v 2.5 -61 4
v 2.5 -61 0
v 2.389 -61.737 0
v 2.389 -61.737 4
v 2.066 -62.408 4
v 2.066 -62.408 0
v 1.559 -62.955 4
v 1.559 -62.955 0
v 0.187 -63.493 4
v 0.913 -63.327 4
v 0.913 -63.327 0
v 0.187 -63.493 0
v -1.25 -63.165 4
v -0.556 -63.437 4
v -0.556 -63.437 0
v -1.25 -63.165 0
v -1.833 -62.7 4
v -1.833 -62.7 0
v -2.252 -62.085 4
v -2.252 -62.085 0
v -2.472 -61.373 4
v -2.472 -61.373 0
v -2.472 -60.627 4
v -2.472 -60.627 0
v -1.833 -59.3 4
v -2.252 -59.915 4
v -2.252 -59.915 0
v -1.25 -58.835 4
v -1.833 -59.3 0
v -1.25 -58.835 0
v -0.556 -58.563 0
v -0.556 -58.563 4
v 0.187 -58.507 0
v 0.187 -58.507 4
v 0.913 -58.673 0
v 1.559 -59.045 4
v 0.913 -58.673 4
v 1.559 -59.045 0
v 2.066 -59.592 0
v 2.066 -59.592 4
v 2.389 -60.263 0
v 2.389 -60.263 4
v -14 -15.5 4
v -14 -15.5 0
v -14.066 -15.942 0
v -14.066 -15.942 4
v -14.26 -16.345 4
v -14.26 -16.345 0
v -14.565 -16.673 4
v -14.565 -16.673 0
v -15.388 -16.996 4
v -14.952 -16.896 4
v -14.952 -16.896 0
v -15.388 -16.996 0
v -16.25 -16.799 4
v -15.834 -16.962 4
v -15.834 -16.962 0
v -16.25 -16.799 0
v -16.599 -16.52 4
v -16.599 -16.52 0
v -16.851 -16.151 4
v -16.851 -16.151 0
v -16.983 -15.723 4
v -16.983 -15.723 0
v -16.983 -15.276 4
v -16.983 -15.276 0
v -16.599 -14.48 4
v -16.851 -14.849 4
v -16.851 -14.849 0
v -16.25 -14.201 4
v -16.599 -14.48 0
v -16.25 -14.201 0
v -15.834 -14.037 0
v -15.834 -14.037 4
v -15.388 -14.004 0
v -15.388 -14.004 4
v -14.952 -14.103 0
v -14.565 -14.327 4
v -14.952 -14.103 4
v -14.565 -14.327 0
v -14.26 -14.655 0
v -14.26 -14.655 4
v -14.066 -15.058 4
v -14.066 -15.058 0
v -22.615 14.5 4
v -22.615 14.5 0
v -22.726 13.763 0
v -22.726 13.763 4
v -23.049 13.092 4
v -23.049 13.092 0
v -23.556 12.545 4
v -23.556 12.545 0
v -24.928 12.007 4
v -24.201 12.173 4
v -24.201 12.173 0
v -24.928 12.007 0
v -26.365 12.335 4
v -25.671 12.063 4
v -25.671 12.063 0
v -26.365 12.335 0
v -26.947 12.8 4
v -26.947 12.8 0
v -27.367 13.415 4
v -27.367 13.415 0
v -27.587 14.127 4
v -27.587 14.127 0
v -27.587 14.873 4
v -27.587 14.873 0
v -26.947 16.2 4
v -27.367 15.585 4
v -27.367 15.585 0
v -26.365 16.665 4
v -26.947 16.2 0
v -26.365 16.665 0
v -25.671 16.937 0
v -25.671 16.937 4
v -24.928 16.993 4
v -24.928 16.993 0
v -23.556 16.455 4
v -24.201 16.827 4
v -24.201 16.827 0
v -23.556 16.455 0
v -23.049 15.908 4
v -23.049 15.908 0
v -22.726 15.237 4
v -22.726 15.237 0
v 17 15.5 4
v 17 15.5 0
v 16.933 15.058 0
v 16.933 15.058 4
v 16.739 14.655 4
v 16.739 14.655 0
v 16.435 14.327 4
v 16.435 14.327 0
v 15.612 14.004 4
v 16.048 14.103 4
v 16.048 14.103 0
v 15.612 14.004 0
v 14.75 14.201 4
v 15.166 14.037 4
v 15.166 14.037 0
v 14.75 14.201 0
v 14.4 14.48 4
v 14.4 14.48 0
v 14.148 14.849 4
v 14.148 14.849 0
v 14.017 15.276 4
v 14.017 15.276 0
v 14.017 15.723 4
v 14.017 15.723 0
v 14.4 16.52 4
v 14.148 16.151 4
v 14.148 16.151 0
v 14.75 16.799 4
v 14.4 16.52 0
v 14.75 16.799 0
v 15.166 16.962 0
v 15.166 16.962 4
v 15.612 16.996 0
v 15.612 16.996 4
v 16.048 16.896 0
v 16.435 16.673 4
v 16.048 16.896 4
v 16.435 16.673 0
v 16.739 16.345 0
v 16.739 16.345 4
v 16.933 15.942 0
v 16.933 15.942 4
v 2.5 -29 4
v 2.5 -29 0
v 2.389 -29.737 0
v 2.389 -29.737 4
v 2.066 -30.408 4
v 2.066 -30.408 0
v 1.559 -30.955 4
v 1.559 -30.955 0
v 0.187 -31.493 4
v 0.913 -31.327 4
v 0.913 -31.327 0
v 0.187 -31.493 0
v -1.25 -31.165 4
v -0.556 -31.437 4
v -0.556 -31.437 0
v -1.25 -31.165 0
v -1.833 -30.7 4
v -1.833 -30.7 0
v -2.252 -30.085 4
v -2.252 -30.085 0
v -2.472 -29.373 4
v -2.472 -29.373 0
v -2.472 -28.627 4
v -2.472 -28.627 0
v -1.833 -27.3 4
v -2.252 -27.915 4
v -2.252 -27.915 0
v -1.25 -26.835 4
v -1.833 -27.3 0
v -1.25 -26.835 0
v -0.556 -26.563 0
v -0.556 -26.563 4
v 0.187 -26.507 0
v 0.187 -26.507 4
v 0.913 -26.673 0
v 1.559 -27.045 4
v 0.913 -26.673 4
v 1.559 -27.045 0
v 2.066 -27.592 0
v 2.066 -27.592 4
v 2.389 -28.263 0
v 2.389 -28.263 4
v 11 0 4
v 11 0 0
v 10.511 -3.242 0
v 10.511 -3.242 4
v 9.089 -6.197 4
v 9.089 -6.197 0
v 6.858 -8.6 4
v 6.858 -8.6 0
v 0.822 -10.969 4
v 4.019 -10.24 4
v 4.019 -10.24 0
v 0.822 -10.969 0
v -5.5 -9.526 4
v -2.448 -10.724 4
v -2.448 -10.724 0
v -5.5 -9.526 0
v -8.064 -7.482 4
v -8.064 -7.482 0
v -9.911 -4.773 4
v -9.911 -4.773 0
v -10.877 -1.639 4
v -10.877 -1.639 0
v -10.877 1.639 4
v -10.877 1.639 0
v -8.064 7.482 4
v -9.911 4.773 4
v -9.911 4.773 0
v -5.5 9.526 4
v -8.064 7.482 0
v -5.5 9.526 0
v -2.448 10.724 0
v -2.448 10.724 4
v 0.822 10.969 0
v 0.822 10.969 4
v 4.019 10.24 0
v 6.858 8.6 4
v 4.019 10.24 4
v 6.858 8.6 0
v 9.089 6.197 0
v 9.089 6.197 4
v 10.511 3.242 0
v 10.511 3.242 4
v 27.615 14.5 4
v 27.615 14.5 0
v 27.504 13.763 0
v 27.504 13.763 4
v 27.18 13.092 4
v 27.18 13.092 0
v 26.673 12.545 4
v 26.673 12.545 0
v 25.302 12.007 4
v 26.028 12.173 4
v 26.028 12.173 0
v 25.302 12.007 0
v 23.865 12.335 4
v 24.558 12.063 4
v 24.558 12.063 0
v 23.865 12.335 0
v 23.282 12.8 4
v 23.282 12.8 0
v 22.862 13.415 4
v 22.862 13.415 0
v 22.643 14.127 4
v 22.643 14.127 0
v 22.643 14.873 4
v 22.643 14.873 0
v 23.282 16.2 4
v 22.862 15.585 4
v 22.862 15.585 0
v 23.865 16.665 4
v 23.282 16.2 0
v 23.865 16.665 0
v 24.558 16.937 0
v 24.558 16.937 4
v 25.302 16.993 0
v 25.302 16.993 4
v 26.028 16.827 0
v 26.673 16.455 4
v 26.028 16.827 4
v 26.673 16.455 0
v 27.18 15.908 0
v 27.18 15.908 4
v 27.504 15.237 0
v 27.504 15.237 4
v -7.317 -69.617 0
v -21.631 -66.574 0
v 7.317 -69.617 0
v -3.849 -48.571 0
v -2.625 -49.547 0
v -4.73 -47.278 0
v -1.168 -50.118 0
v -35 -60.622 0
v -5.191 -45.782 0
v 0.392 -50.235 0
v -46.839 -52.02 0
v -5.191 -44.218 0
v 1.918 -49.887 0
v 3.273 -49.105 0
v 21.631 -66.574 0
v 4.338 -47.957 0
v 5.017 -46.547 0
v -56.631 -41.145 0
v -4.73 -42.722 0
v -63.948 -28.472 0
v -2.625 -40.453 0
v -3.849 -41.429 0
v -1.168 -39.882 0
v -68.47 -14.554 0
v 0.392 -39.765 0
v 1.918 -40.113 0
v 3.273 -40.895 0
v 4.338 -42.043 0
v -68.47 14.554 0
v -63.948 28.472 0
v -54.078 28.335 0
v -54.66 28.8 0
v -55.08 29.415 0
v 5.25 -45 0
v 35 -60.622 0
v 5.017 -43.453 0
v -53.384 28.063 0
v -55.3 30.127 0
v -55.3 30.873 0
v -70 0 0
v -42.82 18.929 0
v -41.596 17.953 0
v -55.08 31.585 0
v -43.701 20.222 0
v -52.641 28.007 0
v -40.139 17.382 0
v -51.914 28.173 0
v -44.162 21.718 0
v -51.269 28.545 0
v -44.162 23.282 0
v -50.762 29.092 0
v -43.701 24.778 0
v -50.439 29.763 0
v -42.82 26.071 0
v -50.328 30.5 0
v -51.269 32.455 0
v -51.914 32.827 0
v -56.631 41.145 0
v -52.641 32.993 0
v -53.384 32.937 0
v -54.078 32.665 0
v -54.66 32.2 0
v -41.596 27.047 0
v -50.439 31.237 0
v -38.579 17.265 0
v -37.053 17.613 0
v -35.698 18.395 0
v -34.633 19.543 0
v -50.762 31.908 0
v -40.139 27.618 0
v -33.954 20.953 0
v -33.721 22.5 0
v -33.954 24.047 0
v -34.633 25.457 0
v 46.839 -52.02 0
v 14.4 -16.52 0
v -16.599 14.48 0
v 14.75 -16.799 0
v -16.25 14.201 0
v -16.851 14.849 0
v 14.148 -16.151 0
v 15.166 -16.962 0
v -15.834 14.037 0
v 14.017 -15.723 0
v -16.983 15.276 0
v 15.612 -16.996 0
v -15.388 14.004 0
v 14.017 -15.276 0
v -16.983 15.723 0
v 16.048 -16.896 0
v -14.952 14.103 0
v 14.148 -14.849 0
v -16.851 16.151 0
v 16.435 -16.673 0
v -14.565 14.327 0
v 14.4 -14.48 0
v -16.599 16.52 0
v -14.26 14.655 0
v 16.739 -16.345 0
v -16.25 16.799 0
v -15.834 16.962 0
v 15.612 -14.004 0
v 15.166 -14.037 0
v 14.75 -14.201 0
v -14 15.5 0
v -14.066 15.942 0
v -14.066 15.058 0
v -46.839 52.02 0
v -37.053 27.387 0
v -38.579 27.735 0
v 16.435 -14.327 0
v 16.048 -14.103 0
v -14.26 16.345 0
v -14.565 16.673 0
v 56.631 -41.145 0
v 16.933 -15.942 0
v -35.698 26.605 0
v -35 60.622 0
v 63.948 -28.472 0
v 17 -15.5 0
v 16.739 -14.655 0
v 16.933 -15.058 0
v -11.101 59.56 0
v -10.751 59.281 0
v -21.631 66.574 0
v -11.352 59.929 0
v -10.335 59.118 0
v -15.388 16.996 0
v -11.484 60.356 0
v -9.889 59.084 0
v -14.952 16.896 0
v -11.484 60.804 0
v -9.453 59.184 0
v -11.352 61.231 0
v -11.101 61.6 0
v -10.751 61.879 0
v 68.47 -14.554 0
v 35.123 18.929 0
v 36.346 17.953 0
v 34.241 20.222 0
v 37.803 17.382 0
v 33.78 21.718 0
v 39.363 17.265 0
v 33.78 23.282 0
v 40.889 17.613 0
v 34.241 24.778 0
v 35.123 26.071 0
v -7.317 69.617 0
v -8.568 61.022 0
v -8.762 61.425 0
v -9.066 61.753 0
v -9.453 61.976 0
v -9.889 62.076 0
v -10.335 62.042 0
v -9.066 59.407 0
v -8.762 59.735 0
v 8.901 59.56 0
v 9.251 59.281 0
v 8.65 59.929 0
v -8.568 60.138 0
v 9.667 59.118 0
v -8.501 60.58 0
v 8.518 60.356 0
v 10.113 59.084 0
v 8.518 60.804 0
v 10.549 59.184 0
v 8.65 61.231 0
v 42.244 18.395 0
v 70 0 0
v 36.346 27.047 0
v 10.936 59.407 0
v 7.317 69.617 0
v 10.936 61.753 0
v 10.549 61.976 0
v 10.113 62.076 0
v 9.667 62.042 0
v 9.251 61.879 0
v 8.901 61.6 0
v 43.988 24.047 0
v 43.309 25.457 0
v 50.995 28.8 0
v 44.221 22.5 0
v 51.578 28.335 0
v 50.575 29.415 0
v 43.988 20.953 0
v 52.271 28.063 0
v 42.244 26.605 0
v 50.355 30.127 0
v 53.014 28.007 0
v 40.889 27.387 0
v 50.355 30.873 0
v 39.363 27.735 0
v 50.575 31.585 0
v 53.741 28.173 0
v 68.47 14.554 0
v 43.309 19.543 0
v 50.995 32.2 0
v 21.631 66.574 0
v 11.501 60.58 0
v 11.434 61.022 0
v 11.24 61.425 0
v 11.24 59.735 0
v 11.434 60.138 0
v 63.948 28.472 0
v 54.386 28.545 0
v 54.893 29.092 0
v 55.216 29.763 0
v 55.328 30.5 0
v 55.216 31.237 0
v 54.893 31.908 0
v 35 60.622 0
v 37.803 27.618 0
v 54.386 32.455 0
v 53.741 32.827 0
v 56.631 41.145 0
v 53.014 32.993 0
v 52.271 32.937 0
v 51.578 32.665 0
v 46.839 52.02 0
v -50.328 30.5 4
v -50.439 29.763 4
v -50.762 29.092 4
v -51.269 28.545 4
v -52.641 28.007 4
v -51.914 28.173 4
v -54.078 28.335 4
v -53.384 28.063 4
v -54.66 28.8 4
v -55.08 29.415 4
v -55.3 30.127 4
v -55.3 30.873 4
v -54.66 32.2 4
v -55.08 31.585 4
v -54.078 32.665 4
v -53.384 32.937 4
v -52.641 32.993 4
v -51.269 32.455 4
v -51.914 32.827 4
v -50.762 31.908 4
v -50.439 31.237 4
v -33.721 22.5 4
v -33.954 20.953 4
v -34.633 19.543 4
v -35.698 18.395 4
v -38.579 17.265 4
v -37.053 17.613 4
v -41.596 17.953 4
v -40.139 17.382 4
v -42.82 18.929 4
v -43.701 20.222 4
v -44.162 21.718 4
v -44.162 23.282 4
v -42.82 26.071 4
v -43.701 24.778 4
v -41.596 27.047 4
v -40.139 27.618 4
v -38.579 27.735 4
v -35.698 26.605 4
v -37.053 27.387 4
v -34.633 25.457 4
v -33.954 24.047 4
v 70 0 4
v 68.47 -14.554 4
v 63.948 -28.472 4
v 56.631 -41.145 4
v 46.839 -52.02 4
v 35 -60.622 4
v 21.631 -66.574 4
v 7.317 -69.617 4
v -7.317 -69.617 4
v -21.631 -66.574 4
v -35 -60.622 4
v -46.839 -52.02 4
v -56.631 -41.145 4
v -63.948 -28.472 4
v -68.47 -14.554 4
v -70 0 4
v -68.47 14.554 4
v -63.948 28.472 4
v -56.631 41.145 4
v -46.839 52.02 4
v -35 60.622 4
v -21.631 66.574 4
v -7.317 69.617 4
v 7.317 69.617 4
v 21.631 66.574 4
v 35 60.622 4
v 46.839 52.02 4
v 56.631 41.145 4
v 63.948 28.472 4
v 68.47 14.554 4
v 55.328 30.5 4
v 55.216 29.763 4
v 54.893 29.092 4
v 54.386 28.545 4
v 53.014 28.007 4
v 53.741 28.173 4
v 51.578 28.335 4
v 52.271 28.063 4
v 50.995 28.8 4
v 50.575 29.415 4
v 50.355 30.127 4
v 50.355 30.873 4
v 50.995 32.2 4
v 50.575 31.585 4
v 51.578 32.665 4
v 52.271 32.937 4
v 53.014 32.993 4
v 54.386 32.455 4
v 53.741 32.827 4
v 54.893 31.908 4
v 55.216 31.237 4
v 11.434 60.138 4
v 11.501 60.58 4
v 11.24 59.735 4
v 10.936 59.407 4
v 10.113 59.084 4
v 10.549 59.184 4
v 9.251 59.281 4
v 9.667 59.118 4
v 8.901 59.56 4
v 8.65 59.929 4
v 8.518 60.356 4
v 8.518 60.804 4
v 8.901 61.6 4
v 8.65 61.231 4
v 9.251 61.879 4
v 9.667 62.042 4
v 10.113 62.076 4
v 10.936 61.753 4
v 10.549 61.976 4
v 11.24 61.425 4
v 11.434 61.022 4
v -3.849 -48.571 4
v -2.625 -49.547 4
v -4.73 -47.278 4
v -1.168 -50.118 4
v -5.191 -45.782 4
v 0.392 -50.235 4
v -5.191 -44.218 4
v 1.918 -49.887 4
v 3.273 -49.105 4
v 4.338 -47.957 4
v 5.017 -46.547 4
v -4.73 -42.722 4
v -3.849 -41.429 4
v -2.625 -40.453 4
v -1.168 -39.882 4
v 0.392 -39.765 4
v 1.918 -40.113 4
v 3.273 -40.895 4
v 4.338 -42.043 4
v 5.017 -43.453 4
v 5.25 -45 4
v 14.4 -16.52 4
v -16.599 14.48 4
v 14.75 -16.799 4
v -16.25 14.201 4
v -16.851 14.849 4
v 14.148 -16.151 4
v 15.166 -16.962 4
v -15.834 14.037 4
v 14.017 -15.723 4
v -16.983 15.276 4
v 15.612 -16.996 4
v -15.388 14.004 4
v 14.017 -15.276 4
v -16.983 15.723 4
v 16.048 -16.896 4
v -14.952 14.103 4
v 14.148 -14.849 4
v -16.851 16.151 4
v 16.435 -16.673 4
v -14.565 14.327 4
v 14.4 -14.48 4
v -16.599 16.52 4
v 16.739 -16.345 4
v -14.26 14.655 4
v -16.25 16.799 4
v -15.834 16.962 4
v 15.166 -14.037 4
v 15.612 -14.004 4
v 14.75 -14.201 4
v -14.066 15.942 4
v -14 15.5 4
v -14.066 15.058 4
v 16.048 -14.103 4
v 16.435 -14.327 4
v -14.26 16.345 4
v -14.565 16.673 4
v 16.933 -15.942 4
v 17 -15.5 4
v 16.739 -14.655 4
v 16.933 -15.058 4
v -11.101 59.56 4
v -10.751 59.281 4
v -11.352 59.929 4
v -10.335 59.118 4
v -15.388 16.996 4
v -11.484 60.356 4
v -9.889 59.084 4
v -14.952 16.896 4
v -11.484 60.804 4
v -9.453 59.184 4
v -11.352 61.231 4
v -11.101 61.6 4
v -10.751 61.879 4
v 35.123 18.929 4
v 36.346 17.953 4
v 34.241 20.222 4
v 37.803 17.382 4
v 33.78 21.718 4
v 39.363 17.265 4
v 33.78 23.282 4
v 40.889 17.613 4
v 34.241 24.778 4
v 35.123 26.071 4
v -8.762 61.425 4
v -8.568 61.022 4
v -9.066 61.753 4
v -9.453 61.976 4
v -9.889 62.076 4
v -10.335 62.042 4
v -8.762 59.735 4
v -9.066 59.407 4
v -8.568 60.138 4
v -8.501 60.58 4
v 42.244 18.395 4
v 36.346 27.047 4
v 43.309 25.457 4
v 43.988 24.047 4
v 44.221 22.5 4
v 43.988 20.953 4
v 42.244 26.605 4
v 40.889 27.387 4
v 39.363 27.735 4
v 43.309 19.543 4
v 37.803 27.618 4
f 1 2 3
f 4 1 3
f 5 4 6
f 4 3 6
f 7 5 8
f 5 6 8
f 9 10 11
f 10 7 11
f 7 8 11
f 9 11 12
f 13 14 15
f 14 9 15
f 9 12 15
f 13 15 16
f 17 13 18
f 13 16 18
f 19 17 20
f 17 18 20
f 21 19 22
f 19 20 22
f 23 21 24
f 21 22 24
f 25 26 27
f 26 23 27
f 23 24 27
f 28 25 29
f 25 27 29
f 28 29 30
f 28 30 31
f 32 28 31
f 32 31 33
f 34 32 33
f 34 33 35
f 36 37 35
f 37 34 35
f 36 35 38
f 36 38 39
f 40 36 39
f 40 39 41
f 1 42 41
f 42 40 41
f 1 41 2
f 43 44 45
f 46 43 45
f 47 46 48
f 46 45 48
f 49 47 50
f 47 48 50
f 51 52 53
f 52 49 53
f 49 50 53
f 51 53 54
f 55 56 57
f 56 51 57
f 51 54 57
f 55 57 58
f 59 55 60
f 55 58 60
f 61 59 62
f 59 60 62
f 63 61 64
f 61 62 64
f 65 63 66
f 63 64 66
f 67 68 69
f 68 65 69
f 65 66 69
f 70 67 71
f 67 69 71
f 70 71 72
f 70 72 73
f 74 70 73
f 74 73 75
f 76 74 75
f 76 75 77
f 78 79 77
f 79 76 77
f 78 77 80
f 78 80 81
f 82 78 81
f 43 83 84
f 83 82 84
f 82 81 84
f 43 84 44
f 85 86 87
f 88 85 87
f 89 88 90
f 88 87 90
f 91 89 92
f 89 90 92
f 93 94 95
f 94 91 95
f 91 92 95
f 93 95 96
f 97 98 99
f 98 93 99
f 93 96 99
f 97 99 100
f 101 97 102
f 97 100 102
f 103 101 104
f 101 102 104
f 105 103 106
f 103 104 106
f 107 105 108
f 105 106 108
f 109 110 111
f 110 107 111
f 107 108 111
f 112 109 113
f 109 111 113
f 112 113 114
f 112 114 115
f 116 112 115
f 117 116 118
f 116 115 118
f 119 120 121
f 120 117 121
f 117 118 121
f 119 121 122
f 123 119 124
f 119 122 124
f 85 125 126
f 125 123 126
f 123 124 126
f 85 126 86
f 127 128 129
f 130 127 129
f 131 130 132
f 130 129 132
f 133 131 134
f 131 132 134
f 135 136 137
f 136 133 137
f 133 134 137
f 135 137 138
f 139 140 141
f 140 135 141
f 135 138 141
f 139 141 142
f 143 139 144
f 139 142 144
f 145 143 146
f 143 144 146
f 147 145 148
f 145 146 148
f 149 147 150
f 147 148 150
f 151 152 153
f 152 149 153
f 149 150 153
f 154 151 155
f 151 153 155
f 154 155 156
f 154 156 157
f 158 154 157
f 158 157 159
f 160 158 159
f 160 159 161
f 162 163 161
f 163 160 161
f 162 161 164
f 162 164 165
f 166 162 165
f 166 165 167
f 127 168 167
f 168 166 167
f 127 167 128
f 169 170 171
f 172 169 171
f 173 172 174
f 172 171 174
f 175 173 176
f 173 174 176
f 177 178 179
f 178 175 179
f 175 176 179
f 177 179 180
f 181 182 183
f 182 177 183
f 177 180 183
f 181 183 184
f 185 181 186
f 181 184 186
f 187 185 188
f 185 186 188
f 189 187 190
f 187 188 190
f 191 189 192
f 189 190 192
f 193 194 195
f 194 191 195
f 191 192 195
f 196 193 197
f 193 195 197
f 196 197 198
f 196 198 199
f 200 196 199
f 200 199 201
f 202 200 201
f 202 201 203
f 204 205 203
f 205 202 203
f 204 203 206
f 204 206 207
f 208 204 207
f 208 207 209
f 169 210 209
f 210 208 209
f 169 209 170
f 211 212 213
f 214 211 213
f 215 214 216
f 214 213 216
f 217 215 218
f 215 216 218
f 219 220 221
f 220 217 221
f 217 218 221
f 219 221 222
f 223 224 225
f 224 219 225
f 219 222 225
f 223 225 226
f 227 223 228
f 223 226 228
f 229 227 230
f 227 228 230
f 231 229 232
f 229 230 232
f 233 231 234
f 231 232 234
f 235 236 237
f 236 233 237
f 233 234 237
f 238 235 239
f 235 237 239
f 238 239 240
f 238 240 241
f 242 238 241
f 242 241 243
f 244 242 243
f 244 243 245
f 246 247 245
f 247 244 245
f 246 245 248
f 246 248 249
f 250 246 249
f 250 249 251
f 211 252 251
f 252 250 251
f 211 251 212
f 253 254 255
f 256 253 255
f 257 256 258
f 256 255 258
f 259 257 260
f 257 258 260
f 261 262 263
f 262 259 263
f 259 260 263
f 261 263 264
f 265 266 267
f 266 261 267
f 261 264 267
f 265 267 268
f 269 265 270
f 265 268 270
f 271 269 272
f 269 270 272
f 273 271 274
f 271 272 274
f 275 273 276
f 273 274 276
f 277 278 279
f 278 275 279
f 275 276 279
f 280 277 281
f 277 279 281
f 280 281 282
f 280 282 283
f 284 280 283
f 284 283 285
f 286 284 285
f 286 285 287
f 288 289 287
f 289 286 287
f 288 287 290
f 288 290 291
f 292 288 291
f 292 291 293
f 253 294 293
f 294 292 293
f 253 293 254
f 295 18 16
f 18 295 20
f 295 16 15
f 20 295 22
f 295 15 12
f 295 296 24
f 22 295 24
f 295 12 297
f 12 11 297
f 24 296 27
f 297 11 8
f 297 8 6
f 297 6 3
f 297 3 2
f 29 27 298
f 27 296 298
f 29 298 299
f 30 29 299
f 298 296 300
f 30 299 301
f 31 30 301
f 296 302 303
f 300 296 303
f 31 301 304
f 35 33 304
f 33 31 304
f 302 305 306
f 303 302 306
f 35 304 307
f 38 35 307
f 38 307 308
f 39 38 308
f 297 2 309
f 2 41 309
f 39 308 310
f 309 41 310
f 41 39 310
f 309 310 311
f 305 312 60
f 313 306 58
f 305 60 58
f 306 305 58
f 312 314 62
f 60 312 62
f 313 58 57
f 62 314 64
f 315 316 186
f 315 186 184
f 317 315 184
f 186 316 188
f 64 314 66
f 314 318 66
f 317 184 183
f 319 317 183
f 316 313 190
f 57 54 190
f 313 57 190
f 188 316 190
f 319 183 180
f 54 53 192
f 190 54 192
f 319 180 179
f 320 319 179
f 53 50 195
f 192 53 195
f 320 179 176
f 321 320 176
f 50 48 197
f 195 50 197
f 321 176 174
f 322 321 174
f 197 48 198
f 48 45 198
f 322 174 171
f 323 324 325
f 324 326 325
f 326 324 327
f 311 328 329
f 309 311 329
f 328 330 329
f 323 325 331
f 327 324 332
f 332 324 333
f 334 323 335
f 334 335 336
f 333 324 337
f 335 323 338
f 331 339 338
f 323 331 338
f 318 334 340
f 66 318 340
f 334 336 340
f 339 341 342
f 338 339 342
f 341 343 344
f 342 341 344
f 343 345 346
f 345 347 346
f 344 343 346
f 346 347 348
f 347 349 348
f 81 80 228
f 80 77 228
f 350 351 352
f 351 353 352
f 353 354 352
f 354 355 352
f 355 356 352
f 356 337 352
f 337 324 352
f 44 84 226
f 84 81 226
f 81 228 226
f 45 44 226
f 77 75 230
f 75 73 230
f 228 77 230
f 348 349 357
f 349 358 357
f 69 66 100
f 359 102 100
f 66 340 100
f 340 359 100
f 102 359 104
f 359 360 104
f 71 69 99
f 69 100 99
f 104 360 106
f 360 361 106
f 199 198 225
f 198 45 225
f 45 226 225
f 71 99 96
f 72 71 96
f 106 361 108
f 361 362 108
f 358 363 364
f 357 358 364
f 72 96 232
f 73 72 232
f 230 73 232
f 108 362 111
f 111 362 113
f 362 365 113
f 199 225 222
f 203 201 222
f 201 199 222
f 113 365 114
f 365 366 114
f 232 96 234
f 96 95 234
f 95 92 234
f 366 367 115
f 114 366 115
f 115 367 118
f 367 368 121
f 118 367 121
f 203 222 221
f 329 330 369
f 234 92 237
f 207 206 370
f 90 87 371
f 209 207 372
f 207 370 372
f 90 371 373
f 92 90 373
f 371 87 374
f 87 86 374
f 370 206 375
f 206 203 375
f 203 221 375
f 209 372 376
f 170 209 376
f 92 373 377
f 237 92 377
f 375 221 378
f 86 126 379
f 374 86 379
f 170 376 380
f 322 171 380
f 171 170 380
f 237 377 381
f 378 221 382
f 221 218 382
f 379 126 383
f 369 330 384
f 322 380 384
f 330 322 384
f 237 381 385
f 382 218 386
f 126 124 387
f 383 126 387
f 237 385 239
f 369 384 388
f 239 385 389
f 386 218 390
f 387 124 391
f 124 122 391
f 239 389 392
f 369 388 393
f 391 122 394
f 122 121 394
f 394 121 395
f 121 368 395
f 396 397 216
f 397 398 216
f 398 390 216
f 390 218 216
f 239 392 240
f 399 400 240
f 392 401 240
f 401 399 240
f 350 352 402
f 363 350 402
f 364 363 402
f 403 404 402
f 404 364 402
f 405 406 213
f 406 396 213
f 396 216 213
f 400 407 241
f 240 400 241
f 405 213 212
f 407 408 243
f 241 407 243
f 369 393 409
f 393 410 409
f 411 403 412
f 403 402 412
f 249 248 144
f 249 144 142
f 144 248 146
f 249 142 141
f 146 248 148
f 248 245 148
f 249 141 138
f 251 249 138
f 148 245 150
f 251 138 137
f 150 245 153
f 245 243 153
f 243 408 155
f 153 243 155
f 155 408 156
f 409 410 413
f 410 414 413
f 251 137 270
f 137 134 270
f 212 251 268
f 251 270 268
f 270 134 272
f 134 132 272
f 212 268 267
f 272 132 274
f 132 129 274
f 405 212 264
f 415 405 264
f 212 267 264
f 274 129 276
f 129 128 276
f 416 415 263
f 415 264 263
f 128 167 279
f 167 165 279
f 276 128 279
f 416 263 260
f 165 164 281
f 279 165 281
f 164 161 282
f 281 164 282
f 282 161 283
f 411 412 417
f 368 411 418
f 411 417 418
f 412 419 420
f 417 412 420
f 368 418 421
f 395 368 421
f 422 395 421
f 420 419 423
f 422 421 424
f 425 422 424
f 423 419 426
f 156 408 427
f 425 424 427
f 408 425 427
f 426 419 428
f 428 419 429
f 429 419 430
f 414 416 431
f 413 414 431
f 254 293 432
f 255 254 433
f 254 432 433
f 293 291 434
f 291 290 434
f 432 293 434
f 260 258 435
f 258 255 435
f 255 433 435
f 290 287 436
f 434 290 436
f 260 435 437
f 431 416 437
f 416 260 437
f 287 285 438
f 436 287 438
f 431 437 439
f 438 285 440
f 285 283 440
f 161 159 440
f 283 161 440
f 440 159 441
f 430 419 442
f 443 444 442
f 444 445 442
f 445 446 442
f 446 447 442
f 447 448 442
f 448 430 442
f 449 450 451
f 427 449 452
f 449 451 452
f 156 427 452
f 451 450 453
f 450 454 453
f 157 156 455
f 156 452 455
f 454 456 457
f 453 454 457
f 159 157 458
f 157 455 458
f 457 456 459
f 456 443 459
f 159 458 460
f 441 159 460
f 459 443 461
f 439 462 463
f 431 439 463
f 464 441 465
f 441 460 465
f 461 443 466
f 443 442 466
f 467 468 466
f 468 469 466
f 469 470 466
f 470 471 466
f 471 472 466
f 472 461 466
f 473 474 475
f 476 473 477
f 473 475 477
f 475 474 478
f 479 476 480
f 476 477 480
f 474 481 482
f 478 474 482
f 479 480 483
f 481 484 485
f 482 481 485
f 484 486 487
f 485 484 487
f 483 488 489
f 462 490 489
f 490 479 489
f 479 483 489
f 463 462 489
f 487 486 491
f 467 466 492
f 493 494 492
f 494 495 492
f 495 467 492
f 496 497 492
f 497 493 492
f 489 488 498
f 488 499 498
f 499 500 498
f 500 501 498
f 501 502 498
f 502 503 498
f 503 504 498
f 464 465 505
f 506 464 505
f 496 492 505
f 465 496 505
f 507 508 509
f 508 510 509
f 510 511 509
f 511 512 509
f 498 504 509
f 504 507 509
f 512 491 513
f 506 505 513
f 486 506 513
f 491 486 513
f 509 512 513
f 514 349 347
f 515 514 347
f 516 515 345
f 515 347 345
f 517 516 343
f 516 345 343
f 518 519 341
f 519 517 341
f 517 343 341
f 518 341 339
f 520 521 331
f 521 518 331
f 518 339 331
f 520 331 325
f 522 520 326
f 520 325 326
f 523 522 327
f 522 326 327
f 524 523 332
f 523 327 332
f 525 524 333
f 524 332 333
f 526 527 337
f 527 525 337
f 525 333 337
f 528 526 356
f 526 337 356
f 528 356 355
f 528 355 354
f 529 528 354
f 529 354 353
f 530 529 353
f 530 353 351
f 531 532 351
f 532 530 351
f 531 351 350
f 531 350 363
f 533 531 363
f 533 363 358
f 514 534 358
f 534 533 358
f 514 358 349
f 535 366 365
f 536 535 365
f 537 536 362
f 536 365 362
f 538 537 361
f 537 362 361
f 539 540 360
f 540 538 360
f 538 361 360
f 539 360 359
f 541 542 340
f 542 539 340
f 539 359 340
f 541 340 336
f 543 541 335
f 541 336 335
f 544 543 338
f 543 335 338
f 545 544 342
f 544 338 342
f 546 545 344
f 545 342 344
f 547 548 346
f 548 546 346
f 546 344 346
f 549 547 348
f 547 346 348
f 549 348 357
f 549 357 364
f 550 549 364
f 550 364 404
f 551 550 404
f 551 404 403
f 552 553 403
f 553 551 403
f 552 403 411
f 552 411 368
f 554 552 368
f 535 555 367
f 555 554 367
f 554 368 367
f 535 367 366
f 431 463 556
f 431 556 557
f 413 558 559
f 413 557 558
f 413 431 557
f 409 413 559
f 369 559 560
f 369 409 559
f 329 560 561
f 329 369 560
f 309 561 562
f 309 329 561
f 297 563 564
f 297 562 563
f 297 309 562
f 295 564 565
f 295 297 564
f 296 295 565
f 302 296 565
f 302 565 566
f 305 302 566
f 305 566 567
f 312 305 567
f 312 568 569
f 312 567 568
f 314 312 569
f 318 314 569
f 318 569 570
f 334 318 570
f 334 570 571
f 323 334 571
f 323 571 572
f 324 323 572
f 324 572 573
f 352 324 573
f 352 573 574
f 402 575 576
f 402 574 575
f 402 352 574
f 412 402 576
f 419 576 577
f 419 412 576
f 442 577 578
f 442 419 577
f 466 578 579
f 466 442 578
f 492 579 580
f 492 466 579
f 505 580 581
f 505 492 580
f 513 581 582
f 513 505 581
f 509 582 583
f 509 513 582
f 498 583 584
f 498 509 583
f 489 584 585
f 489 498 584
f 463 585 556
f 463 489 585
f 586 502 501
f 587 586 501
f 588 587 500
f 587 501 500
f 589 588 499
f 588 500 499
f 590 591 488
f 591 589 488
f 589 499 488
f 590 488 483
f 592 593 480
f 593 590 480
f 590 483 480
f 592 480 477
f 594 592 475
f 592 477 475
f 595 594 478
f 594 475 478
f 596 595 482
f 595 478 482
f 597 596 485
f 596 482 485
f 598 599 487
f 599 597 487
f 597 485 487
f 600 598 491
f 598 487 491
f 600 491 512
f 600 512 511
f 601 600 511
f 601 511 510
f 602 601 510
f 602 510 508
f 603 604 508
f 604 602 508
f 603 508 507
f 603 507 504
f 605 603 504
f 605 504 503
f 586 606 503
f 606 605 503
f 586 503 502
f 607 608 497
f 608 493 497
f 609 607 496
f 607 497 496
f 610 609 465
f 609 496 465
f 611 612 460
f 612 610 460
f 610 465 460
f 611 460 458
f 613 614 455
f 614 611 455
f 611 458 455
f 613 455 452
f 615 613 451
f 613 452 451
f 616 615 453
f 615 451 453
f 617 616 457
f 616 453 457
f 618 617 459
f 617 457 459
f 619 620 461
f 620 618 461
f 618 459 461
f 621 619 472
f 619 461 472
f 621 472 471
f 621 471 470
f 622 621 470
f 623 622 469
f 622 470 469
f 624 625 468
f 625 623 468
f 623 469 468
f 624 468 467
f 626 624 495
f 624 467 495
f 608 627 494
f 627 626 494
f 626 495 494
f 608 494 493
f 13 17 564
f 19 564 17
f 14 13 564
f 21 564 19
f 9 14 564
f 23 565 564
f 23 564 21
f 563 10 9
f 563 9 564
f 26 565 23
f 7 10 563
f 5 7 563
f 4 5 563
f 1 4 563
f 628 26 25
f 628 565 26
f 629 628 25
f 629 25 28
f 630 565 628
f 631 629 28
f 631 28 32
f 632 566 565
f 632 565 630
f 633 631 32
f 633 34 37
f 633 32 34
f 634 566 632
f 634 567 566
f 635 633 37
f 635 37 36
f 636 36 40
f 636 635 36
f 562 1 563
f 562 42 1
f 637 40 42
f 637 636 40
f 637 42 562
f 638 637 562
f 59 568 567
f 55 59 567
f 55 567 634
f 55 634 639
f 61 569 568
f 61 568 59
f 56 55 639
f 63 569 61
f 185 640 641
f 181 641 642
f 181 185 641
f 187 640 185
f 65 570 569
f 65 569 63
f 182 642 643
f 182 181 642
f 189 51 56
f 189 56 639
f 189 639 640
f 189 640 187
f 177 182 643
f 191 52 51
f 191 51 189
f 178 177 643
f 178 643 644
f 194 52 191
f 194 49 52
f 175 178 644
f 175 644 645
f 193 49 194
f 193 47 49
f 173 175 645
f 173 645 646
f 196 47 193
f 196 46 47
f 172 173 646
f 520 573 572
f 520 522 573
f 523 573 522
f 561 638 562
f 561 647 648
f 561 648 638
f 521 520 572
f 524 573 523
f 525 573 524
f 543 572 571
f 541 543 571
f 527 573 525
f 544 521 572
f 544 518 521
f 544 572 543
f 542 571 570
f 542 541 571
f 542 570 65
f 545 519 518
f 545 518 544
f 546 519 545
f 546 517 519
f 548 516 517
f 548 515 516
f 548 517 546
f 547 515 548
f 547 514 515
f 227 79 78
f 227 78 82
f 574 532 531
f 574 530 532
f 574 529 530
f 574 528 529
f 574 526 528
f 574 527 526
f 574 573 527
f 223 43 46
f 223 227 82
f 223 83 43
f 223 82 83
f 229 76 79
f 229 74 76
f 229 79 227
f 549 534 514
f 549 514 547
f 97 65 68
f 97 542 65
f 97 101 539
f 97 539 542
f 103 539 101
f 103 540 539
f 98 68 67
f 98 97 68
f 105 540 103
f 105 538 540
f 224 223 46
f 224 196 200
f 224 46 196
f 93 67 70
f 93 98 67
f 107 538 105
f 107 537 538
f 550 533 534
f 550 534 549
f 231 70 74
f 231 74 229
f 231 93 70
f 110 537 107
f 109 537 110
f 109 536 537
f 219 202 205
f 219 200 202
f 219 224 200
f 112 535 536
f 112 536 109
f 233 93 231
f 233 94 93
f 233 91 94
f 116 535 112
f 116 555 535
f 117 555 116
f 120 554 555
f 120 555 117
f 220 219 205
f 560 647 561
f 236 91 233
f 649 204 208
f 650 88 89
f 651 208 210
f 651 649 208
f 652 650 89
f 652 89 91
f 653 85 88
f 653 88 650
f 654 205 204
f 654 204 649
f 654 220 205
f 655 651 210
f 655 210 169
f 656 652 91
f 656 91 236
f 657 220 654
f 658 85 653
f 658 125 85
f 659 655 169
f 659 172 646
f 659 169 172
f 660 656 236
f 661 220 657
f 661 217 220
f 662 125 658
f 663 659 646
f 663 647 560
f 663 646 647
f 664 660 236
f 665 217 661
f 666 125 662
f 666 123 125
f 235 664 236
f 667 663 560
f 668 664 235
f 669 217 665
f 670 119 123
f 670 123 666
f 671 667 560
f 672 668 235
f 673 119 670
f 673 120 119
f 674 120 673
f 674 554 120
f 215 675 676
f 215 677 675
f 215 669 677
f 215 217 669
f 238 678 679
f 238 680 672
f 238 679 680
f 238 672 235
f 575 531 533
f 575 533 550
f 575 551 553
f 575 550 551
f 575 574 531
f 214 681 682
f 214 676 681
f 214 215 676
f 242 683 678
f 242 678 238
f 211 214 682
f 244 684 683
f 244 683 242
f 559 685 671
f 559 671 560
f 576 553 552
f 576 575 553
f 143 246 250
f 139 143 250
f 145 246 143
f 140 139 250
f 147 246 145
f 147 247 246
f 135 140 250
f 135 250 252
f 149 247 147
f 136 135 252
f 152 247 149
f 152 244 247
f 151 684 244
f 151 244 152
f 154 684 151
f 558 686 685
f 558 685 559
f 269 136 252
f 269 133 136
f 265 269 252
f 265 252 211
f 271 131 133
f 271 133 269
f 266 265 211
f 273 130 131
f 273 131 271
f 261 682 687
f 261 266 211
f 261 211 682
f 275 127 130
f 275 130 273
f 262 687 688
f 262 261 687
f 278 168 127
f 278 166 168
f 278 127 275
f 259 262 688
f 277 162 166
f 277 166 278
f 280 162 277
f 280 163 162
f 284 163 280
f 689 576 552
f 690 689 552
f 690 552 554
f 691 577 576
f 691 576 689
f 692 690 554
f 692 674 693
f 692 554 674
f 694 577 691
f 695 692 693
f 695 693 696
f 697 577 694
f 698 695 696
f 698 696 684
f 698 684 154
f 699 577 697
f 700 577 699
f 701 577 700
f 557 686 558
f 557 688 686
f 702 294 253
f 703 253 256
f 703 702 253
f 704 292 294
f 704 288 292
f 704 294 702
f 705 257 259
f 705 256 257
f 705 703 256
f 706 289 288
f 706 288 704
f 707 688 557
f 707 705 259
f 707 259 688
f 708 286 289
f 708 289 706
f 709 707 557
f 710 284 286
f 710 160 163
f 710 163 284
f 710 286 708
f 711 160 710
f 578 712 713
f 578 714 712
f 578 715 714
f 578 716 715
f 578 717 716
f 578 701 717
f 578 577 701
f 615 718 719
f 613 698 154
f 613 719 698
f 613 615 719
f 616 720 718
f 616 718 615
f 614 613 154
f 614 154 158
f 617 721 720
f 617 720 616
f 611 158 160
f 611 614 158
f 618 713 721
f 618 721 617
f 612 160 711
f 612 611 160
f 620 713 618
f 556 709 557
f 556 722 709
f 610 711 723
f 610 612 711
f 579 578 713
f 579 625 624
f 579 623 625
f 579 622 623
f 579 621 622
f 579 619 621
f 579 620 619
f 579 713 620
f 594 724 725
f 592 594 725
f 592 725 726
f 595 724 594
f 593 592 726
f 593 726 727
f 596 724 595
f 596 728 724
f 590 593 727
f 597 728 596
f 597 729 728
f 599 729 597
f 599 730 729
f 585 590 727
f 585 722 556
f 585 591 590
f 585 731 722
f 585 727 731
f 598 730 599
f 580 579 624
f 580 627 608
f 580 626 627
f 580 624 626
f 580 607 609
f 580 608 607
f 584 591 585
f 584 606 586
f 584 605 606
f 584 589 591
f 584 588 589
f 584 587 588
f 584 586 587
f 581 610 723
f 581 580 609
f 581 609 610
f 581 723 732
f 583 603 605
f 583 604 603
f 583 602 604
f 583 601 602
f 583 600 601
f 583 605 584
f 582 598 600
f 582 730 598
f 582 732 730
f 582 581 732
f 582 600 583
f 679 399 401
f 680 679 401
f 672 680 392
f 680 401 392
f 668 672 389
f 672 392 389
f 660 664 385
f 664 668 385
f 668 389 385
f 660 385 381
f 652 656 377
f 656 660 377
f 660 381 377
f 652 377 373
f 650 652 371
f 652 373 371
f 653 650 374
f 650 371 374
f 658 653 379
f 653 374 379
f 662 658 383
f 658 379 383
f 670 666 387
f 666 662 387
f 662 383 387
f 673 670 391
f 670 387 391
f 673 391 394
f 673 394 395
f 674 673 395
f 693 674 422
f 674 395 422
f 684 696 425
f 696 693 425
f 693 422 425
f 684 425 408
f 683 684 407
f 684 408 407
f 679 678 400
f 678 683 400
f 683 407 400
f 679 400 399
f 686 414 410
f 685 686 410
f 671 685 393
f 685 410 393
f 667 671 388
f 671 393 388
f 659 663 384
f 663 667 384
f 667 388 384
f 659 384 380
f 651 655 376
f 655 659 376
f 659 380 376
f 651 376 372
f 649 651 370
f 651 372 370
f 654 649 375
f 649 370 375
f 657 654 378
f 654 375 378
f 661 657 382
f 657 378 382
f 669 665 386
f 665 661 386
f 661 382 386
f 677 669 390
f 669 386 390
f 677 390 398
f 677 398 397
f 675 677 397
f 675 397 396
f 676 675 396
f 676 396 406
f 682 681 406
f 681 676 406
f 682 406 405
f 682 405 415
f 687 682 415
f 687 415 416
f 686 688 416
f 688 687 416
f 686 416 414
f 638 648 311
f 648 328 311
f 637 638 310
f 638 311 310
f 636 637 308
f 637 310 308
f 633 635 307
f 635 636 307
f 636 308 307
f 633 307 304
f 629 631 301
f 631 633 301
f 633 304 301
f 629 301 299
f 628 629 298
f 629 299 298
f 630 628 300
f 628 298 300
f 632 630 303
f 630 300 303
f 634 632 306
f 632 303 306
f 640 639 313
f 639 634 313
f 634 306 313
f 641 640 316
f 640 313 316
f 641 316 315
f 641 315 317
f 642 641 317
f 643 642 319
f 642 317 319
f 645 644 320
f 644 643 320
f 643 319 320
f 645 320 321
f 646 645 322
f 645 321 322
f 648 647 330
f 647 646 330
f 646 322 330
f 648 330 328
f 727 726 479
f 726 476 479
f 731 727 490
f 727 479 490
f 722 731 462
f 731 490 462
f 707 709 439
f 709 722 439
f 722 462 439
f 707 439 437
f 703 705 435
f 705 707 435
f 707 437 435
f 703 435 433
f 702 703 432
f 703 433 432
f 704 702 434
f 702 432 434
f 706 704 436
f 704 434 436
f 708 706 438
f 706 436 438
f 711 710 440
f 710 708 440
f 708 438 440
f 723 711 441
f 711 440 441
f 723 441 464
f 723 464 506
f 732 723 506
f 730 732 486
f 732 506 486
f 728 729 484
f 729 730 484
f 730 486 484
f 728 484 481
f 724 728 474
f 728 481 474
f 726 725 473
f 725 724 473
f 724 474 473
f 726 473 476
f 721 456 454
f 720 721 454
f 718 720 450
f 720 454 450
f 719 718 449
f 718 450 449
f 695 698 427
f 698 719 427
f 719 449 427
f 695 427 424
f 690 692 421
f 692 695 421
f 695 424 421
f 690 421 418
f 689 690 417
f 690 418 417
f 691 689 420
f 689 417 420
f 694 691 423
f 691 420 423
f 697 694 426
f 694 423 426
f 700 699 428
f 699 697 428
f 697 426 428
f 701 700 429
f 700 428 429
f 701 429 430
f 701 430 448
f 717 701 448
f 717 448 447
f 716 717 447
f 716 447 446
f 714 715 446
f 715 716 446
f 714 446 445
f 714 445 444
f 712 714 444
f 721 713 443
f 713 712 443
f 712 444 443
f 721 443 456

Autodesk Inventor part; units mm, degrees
ref_plane "YZ Plane" through (0, 0, 0) normal (1, 0, 0) x (0, 1, 0)
ref_plane "XZ Plane" through (0, 0, 0) normal (0, 1, 0) x (-1, 0, 0)
ref_plane "XY Plane" through (0, 0, 0) normal (0, 0, 1) x (1, 0, 0)
sketch "Sketch1" plane through (0, 0, 0) normal (0, 0, 1) x (1, 0, 0)
  circle A0 centre (0, 0) radius 70
  circle A1 centre (0, -45) radius 5.25
  circle A2 centre (0, 0) radius 11
  circle A3 centre (10.001, 60.58) radius 1.5
  circle A4 centre (-10.001, 60.58) radius 1.5
  circle A5 centre (15.4998, 15.4998) radius 1.5
  circle A6 centre (0, -29) radius 2.5
  circle A7 centre (0, -61) radius 2.5
  circle A8 centre (52.8275, 30.5) radius 2.5
  circle A9 centre (38.9711, 22.5) radius 5.25
  circle A10 centre (25.1147, 14.5) radius 2.5
  circle A11 centre (-52.8275, 30.5) radius 2.5
  circle A12 centre (-38.9711, 22.5) radius 5.25
  circle A13 centre (-25.1147, 14.5) radius 2.5
  circle A14 centre (0, 0) radius 21.92 construction
  circle A15 centre (-15.4998, 15.4998) radius 1.5
  circle A16 centre (-15.4998, -15.4998) radius 1.5
  circle A17 centre (15.4998, -15.4998) radius 1.5
  dimension "d53" = 43.84
  dimension "D_B" = 140
  dimension "Furos" = 10.5
  dimension "d11" = 22
  dimension "d24" = 3
  dimension "d25" = 3
  dimension "FN" = 3
  dimension "d31" = 5
  dimension "d32" = 5
  dimension "d34" = 16
  dimension "d35" = 16
  dimension "d36" = 10.001
  dimension "d37" = 10.001
  dimension "d38" = 60.58
  dimension "d39" = 60.58
  dimension "d40" = 45
  dimension "d50" = 360
  dimension "d56" = 360
  dimension "d58" = 15.4998
  dimension "d59" = 15.4998
extrude "Extrusion1" add sketch "Sketch1" along normal blind 4
properties part number "test_topo"
